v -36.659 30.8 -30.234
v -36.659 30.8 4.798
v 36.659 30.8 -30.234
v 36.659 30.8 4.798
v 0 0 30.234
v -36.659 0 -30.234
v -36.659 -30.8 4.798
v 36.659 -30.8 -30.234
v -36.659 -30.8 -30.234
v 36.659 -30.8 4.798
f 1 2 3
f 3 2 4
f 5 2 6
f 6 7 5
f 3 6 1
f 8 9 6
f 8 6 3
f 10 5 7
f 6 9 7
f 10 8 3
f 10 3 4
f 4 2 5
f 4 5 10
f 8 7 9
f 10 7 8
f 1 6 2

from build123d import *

# Parameters (mm, degrees)
F0_W     = 73.3171850443
F0_H     = 60.4678094387
F1_DEPTH = 30.8
F3_DEPTH = 61.601
F5_DEPTH = 73.3181850443


# Not quite as in the source:
# - a feature of the source that left no trace in its solid (it failed there, or was rolled back) is left out


with BuildPart() as f1:
    # F0 (on Front) → F1 (new body, symmetric)
    with BuildSketch(Plane.XZ):
        Rectangle(F0_W, F0_H)
    extrude(amount=F1_DEPTH, both=True)

    # F2 (on face) → F3 (cut, through all)
    with BuildSketch(Plane.XZ.offset(30.8)):
        Polygon((-36.6585925221, 30.2339047194), (-36.6585925221, 4.7981617972), (0, 30.2339047194), align=None)
        Polygon((36.6585925221, 30.2339047194), (0, 30.2339047194), (36.6585925221, 4.7981617972), align=None)
    extrude(amount=-F3_DEPTH, mode=Mode.SUBTRACT)

    # F4 (on face) → F5 (cut, through all)
    with BuildSketch(Plane(origin=(-36.6585925221, 0, 0), x_dir=(0, -1, 0), z_dir=(-1, 0, 0))):
        Polygon((0, 30.2339047194), (-30.8, 30.2339047194), (-30.8, 4.7981617972), align=None)
        Polygon((30.8, 30.2339047194), (0, 30.2339047194), (30.8, 4.7981617972), align=None)
    extrude(amount=-F5_DEPTH, mode=Mode.SUBTRACT)

    # F10: sweep along a path in F9
    with BuildLine(Plane(origin=(-9.9452522809, 6.8577617895, 6.0293064075), x_dir=(-0.4343419548, -0.8613999118, 0.2633196883), z_dir=(-0.7366055839, 0.5079273491, 0.4465669287))) as f10_path:
        Line((7.9611823679, -9.5022734797), (43.7169324882, -14.9015133699))
    # F6 (on Front) → F10 (sweep, cut)
    with BuildSketch(Plane.XZ):
        Polygon((-36.6585925221, 4.7981617972), (-36.6585925221, -30.2339047194), (0, 30.2339047194), align=None)
    sweep(path=f10_path.line, mode=Mode.SUBTRACT)

    # F11: F1 across plane


with BuildPart() as f1_1:
    add(f1.part)
    add(f1.part.mirror(Plane.XZ), mode=Mode.INTERSECT)


solid = f1_1.part
